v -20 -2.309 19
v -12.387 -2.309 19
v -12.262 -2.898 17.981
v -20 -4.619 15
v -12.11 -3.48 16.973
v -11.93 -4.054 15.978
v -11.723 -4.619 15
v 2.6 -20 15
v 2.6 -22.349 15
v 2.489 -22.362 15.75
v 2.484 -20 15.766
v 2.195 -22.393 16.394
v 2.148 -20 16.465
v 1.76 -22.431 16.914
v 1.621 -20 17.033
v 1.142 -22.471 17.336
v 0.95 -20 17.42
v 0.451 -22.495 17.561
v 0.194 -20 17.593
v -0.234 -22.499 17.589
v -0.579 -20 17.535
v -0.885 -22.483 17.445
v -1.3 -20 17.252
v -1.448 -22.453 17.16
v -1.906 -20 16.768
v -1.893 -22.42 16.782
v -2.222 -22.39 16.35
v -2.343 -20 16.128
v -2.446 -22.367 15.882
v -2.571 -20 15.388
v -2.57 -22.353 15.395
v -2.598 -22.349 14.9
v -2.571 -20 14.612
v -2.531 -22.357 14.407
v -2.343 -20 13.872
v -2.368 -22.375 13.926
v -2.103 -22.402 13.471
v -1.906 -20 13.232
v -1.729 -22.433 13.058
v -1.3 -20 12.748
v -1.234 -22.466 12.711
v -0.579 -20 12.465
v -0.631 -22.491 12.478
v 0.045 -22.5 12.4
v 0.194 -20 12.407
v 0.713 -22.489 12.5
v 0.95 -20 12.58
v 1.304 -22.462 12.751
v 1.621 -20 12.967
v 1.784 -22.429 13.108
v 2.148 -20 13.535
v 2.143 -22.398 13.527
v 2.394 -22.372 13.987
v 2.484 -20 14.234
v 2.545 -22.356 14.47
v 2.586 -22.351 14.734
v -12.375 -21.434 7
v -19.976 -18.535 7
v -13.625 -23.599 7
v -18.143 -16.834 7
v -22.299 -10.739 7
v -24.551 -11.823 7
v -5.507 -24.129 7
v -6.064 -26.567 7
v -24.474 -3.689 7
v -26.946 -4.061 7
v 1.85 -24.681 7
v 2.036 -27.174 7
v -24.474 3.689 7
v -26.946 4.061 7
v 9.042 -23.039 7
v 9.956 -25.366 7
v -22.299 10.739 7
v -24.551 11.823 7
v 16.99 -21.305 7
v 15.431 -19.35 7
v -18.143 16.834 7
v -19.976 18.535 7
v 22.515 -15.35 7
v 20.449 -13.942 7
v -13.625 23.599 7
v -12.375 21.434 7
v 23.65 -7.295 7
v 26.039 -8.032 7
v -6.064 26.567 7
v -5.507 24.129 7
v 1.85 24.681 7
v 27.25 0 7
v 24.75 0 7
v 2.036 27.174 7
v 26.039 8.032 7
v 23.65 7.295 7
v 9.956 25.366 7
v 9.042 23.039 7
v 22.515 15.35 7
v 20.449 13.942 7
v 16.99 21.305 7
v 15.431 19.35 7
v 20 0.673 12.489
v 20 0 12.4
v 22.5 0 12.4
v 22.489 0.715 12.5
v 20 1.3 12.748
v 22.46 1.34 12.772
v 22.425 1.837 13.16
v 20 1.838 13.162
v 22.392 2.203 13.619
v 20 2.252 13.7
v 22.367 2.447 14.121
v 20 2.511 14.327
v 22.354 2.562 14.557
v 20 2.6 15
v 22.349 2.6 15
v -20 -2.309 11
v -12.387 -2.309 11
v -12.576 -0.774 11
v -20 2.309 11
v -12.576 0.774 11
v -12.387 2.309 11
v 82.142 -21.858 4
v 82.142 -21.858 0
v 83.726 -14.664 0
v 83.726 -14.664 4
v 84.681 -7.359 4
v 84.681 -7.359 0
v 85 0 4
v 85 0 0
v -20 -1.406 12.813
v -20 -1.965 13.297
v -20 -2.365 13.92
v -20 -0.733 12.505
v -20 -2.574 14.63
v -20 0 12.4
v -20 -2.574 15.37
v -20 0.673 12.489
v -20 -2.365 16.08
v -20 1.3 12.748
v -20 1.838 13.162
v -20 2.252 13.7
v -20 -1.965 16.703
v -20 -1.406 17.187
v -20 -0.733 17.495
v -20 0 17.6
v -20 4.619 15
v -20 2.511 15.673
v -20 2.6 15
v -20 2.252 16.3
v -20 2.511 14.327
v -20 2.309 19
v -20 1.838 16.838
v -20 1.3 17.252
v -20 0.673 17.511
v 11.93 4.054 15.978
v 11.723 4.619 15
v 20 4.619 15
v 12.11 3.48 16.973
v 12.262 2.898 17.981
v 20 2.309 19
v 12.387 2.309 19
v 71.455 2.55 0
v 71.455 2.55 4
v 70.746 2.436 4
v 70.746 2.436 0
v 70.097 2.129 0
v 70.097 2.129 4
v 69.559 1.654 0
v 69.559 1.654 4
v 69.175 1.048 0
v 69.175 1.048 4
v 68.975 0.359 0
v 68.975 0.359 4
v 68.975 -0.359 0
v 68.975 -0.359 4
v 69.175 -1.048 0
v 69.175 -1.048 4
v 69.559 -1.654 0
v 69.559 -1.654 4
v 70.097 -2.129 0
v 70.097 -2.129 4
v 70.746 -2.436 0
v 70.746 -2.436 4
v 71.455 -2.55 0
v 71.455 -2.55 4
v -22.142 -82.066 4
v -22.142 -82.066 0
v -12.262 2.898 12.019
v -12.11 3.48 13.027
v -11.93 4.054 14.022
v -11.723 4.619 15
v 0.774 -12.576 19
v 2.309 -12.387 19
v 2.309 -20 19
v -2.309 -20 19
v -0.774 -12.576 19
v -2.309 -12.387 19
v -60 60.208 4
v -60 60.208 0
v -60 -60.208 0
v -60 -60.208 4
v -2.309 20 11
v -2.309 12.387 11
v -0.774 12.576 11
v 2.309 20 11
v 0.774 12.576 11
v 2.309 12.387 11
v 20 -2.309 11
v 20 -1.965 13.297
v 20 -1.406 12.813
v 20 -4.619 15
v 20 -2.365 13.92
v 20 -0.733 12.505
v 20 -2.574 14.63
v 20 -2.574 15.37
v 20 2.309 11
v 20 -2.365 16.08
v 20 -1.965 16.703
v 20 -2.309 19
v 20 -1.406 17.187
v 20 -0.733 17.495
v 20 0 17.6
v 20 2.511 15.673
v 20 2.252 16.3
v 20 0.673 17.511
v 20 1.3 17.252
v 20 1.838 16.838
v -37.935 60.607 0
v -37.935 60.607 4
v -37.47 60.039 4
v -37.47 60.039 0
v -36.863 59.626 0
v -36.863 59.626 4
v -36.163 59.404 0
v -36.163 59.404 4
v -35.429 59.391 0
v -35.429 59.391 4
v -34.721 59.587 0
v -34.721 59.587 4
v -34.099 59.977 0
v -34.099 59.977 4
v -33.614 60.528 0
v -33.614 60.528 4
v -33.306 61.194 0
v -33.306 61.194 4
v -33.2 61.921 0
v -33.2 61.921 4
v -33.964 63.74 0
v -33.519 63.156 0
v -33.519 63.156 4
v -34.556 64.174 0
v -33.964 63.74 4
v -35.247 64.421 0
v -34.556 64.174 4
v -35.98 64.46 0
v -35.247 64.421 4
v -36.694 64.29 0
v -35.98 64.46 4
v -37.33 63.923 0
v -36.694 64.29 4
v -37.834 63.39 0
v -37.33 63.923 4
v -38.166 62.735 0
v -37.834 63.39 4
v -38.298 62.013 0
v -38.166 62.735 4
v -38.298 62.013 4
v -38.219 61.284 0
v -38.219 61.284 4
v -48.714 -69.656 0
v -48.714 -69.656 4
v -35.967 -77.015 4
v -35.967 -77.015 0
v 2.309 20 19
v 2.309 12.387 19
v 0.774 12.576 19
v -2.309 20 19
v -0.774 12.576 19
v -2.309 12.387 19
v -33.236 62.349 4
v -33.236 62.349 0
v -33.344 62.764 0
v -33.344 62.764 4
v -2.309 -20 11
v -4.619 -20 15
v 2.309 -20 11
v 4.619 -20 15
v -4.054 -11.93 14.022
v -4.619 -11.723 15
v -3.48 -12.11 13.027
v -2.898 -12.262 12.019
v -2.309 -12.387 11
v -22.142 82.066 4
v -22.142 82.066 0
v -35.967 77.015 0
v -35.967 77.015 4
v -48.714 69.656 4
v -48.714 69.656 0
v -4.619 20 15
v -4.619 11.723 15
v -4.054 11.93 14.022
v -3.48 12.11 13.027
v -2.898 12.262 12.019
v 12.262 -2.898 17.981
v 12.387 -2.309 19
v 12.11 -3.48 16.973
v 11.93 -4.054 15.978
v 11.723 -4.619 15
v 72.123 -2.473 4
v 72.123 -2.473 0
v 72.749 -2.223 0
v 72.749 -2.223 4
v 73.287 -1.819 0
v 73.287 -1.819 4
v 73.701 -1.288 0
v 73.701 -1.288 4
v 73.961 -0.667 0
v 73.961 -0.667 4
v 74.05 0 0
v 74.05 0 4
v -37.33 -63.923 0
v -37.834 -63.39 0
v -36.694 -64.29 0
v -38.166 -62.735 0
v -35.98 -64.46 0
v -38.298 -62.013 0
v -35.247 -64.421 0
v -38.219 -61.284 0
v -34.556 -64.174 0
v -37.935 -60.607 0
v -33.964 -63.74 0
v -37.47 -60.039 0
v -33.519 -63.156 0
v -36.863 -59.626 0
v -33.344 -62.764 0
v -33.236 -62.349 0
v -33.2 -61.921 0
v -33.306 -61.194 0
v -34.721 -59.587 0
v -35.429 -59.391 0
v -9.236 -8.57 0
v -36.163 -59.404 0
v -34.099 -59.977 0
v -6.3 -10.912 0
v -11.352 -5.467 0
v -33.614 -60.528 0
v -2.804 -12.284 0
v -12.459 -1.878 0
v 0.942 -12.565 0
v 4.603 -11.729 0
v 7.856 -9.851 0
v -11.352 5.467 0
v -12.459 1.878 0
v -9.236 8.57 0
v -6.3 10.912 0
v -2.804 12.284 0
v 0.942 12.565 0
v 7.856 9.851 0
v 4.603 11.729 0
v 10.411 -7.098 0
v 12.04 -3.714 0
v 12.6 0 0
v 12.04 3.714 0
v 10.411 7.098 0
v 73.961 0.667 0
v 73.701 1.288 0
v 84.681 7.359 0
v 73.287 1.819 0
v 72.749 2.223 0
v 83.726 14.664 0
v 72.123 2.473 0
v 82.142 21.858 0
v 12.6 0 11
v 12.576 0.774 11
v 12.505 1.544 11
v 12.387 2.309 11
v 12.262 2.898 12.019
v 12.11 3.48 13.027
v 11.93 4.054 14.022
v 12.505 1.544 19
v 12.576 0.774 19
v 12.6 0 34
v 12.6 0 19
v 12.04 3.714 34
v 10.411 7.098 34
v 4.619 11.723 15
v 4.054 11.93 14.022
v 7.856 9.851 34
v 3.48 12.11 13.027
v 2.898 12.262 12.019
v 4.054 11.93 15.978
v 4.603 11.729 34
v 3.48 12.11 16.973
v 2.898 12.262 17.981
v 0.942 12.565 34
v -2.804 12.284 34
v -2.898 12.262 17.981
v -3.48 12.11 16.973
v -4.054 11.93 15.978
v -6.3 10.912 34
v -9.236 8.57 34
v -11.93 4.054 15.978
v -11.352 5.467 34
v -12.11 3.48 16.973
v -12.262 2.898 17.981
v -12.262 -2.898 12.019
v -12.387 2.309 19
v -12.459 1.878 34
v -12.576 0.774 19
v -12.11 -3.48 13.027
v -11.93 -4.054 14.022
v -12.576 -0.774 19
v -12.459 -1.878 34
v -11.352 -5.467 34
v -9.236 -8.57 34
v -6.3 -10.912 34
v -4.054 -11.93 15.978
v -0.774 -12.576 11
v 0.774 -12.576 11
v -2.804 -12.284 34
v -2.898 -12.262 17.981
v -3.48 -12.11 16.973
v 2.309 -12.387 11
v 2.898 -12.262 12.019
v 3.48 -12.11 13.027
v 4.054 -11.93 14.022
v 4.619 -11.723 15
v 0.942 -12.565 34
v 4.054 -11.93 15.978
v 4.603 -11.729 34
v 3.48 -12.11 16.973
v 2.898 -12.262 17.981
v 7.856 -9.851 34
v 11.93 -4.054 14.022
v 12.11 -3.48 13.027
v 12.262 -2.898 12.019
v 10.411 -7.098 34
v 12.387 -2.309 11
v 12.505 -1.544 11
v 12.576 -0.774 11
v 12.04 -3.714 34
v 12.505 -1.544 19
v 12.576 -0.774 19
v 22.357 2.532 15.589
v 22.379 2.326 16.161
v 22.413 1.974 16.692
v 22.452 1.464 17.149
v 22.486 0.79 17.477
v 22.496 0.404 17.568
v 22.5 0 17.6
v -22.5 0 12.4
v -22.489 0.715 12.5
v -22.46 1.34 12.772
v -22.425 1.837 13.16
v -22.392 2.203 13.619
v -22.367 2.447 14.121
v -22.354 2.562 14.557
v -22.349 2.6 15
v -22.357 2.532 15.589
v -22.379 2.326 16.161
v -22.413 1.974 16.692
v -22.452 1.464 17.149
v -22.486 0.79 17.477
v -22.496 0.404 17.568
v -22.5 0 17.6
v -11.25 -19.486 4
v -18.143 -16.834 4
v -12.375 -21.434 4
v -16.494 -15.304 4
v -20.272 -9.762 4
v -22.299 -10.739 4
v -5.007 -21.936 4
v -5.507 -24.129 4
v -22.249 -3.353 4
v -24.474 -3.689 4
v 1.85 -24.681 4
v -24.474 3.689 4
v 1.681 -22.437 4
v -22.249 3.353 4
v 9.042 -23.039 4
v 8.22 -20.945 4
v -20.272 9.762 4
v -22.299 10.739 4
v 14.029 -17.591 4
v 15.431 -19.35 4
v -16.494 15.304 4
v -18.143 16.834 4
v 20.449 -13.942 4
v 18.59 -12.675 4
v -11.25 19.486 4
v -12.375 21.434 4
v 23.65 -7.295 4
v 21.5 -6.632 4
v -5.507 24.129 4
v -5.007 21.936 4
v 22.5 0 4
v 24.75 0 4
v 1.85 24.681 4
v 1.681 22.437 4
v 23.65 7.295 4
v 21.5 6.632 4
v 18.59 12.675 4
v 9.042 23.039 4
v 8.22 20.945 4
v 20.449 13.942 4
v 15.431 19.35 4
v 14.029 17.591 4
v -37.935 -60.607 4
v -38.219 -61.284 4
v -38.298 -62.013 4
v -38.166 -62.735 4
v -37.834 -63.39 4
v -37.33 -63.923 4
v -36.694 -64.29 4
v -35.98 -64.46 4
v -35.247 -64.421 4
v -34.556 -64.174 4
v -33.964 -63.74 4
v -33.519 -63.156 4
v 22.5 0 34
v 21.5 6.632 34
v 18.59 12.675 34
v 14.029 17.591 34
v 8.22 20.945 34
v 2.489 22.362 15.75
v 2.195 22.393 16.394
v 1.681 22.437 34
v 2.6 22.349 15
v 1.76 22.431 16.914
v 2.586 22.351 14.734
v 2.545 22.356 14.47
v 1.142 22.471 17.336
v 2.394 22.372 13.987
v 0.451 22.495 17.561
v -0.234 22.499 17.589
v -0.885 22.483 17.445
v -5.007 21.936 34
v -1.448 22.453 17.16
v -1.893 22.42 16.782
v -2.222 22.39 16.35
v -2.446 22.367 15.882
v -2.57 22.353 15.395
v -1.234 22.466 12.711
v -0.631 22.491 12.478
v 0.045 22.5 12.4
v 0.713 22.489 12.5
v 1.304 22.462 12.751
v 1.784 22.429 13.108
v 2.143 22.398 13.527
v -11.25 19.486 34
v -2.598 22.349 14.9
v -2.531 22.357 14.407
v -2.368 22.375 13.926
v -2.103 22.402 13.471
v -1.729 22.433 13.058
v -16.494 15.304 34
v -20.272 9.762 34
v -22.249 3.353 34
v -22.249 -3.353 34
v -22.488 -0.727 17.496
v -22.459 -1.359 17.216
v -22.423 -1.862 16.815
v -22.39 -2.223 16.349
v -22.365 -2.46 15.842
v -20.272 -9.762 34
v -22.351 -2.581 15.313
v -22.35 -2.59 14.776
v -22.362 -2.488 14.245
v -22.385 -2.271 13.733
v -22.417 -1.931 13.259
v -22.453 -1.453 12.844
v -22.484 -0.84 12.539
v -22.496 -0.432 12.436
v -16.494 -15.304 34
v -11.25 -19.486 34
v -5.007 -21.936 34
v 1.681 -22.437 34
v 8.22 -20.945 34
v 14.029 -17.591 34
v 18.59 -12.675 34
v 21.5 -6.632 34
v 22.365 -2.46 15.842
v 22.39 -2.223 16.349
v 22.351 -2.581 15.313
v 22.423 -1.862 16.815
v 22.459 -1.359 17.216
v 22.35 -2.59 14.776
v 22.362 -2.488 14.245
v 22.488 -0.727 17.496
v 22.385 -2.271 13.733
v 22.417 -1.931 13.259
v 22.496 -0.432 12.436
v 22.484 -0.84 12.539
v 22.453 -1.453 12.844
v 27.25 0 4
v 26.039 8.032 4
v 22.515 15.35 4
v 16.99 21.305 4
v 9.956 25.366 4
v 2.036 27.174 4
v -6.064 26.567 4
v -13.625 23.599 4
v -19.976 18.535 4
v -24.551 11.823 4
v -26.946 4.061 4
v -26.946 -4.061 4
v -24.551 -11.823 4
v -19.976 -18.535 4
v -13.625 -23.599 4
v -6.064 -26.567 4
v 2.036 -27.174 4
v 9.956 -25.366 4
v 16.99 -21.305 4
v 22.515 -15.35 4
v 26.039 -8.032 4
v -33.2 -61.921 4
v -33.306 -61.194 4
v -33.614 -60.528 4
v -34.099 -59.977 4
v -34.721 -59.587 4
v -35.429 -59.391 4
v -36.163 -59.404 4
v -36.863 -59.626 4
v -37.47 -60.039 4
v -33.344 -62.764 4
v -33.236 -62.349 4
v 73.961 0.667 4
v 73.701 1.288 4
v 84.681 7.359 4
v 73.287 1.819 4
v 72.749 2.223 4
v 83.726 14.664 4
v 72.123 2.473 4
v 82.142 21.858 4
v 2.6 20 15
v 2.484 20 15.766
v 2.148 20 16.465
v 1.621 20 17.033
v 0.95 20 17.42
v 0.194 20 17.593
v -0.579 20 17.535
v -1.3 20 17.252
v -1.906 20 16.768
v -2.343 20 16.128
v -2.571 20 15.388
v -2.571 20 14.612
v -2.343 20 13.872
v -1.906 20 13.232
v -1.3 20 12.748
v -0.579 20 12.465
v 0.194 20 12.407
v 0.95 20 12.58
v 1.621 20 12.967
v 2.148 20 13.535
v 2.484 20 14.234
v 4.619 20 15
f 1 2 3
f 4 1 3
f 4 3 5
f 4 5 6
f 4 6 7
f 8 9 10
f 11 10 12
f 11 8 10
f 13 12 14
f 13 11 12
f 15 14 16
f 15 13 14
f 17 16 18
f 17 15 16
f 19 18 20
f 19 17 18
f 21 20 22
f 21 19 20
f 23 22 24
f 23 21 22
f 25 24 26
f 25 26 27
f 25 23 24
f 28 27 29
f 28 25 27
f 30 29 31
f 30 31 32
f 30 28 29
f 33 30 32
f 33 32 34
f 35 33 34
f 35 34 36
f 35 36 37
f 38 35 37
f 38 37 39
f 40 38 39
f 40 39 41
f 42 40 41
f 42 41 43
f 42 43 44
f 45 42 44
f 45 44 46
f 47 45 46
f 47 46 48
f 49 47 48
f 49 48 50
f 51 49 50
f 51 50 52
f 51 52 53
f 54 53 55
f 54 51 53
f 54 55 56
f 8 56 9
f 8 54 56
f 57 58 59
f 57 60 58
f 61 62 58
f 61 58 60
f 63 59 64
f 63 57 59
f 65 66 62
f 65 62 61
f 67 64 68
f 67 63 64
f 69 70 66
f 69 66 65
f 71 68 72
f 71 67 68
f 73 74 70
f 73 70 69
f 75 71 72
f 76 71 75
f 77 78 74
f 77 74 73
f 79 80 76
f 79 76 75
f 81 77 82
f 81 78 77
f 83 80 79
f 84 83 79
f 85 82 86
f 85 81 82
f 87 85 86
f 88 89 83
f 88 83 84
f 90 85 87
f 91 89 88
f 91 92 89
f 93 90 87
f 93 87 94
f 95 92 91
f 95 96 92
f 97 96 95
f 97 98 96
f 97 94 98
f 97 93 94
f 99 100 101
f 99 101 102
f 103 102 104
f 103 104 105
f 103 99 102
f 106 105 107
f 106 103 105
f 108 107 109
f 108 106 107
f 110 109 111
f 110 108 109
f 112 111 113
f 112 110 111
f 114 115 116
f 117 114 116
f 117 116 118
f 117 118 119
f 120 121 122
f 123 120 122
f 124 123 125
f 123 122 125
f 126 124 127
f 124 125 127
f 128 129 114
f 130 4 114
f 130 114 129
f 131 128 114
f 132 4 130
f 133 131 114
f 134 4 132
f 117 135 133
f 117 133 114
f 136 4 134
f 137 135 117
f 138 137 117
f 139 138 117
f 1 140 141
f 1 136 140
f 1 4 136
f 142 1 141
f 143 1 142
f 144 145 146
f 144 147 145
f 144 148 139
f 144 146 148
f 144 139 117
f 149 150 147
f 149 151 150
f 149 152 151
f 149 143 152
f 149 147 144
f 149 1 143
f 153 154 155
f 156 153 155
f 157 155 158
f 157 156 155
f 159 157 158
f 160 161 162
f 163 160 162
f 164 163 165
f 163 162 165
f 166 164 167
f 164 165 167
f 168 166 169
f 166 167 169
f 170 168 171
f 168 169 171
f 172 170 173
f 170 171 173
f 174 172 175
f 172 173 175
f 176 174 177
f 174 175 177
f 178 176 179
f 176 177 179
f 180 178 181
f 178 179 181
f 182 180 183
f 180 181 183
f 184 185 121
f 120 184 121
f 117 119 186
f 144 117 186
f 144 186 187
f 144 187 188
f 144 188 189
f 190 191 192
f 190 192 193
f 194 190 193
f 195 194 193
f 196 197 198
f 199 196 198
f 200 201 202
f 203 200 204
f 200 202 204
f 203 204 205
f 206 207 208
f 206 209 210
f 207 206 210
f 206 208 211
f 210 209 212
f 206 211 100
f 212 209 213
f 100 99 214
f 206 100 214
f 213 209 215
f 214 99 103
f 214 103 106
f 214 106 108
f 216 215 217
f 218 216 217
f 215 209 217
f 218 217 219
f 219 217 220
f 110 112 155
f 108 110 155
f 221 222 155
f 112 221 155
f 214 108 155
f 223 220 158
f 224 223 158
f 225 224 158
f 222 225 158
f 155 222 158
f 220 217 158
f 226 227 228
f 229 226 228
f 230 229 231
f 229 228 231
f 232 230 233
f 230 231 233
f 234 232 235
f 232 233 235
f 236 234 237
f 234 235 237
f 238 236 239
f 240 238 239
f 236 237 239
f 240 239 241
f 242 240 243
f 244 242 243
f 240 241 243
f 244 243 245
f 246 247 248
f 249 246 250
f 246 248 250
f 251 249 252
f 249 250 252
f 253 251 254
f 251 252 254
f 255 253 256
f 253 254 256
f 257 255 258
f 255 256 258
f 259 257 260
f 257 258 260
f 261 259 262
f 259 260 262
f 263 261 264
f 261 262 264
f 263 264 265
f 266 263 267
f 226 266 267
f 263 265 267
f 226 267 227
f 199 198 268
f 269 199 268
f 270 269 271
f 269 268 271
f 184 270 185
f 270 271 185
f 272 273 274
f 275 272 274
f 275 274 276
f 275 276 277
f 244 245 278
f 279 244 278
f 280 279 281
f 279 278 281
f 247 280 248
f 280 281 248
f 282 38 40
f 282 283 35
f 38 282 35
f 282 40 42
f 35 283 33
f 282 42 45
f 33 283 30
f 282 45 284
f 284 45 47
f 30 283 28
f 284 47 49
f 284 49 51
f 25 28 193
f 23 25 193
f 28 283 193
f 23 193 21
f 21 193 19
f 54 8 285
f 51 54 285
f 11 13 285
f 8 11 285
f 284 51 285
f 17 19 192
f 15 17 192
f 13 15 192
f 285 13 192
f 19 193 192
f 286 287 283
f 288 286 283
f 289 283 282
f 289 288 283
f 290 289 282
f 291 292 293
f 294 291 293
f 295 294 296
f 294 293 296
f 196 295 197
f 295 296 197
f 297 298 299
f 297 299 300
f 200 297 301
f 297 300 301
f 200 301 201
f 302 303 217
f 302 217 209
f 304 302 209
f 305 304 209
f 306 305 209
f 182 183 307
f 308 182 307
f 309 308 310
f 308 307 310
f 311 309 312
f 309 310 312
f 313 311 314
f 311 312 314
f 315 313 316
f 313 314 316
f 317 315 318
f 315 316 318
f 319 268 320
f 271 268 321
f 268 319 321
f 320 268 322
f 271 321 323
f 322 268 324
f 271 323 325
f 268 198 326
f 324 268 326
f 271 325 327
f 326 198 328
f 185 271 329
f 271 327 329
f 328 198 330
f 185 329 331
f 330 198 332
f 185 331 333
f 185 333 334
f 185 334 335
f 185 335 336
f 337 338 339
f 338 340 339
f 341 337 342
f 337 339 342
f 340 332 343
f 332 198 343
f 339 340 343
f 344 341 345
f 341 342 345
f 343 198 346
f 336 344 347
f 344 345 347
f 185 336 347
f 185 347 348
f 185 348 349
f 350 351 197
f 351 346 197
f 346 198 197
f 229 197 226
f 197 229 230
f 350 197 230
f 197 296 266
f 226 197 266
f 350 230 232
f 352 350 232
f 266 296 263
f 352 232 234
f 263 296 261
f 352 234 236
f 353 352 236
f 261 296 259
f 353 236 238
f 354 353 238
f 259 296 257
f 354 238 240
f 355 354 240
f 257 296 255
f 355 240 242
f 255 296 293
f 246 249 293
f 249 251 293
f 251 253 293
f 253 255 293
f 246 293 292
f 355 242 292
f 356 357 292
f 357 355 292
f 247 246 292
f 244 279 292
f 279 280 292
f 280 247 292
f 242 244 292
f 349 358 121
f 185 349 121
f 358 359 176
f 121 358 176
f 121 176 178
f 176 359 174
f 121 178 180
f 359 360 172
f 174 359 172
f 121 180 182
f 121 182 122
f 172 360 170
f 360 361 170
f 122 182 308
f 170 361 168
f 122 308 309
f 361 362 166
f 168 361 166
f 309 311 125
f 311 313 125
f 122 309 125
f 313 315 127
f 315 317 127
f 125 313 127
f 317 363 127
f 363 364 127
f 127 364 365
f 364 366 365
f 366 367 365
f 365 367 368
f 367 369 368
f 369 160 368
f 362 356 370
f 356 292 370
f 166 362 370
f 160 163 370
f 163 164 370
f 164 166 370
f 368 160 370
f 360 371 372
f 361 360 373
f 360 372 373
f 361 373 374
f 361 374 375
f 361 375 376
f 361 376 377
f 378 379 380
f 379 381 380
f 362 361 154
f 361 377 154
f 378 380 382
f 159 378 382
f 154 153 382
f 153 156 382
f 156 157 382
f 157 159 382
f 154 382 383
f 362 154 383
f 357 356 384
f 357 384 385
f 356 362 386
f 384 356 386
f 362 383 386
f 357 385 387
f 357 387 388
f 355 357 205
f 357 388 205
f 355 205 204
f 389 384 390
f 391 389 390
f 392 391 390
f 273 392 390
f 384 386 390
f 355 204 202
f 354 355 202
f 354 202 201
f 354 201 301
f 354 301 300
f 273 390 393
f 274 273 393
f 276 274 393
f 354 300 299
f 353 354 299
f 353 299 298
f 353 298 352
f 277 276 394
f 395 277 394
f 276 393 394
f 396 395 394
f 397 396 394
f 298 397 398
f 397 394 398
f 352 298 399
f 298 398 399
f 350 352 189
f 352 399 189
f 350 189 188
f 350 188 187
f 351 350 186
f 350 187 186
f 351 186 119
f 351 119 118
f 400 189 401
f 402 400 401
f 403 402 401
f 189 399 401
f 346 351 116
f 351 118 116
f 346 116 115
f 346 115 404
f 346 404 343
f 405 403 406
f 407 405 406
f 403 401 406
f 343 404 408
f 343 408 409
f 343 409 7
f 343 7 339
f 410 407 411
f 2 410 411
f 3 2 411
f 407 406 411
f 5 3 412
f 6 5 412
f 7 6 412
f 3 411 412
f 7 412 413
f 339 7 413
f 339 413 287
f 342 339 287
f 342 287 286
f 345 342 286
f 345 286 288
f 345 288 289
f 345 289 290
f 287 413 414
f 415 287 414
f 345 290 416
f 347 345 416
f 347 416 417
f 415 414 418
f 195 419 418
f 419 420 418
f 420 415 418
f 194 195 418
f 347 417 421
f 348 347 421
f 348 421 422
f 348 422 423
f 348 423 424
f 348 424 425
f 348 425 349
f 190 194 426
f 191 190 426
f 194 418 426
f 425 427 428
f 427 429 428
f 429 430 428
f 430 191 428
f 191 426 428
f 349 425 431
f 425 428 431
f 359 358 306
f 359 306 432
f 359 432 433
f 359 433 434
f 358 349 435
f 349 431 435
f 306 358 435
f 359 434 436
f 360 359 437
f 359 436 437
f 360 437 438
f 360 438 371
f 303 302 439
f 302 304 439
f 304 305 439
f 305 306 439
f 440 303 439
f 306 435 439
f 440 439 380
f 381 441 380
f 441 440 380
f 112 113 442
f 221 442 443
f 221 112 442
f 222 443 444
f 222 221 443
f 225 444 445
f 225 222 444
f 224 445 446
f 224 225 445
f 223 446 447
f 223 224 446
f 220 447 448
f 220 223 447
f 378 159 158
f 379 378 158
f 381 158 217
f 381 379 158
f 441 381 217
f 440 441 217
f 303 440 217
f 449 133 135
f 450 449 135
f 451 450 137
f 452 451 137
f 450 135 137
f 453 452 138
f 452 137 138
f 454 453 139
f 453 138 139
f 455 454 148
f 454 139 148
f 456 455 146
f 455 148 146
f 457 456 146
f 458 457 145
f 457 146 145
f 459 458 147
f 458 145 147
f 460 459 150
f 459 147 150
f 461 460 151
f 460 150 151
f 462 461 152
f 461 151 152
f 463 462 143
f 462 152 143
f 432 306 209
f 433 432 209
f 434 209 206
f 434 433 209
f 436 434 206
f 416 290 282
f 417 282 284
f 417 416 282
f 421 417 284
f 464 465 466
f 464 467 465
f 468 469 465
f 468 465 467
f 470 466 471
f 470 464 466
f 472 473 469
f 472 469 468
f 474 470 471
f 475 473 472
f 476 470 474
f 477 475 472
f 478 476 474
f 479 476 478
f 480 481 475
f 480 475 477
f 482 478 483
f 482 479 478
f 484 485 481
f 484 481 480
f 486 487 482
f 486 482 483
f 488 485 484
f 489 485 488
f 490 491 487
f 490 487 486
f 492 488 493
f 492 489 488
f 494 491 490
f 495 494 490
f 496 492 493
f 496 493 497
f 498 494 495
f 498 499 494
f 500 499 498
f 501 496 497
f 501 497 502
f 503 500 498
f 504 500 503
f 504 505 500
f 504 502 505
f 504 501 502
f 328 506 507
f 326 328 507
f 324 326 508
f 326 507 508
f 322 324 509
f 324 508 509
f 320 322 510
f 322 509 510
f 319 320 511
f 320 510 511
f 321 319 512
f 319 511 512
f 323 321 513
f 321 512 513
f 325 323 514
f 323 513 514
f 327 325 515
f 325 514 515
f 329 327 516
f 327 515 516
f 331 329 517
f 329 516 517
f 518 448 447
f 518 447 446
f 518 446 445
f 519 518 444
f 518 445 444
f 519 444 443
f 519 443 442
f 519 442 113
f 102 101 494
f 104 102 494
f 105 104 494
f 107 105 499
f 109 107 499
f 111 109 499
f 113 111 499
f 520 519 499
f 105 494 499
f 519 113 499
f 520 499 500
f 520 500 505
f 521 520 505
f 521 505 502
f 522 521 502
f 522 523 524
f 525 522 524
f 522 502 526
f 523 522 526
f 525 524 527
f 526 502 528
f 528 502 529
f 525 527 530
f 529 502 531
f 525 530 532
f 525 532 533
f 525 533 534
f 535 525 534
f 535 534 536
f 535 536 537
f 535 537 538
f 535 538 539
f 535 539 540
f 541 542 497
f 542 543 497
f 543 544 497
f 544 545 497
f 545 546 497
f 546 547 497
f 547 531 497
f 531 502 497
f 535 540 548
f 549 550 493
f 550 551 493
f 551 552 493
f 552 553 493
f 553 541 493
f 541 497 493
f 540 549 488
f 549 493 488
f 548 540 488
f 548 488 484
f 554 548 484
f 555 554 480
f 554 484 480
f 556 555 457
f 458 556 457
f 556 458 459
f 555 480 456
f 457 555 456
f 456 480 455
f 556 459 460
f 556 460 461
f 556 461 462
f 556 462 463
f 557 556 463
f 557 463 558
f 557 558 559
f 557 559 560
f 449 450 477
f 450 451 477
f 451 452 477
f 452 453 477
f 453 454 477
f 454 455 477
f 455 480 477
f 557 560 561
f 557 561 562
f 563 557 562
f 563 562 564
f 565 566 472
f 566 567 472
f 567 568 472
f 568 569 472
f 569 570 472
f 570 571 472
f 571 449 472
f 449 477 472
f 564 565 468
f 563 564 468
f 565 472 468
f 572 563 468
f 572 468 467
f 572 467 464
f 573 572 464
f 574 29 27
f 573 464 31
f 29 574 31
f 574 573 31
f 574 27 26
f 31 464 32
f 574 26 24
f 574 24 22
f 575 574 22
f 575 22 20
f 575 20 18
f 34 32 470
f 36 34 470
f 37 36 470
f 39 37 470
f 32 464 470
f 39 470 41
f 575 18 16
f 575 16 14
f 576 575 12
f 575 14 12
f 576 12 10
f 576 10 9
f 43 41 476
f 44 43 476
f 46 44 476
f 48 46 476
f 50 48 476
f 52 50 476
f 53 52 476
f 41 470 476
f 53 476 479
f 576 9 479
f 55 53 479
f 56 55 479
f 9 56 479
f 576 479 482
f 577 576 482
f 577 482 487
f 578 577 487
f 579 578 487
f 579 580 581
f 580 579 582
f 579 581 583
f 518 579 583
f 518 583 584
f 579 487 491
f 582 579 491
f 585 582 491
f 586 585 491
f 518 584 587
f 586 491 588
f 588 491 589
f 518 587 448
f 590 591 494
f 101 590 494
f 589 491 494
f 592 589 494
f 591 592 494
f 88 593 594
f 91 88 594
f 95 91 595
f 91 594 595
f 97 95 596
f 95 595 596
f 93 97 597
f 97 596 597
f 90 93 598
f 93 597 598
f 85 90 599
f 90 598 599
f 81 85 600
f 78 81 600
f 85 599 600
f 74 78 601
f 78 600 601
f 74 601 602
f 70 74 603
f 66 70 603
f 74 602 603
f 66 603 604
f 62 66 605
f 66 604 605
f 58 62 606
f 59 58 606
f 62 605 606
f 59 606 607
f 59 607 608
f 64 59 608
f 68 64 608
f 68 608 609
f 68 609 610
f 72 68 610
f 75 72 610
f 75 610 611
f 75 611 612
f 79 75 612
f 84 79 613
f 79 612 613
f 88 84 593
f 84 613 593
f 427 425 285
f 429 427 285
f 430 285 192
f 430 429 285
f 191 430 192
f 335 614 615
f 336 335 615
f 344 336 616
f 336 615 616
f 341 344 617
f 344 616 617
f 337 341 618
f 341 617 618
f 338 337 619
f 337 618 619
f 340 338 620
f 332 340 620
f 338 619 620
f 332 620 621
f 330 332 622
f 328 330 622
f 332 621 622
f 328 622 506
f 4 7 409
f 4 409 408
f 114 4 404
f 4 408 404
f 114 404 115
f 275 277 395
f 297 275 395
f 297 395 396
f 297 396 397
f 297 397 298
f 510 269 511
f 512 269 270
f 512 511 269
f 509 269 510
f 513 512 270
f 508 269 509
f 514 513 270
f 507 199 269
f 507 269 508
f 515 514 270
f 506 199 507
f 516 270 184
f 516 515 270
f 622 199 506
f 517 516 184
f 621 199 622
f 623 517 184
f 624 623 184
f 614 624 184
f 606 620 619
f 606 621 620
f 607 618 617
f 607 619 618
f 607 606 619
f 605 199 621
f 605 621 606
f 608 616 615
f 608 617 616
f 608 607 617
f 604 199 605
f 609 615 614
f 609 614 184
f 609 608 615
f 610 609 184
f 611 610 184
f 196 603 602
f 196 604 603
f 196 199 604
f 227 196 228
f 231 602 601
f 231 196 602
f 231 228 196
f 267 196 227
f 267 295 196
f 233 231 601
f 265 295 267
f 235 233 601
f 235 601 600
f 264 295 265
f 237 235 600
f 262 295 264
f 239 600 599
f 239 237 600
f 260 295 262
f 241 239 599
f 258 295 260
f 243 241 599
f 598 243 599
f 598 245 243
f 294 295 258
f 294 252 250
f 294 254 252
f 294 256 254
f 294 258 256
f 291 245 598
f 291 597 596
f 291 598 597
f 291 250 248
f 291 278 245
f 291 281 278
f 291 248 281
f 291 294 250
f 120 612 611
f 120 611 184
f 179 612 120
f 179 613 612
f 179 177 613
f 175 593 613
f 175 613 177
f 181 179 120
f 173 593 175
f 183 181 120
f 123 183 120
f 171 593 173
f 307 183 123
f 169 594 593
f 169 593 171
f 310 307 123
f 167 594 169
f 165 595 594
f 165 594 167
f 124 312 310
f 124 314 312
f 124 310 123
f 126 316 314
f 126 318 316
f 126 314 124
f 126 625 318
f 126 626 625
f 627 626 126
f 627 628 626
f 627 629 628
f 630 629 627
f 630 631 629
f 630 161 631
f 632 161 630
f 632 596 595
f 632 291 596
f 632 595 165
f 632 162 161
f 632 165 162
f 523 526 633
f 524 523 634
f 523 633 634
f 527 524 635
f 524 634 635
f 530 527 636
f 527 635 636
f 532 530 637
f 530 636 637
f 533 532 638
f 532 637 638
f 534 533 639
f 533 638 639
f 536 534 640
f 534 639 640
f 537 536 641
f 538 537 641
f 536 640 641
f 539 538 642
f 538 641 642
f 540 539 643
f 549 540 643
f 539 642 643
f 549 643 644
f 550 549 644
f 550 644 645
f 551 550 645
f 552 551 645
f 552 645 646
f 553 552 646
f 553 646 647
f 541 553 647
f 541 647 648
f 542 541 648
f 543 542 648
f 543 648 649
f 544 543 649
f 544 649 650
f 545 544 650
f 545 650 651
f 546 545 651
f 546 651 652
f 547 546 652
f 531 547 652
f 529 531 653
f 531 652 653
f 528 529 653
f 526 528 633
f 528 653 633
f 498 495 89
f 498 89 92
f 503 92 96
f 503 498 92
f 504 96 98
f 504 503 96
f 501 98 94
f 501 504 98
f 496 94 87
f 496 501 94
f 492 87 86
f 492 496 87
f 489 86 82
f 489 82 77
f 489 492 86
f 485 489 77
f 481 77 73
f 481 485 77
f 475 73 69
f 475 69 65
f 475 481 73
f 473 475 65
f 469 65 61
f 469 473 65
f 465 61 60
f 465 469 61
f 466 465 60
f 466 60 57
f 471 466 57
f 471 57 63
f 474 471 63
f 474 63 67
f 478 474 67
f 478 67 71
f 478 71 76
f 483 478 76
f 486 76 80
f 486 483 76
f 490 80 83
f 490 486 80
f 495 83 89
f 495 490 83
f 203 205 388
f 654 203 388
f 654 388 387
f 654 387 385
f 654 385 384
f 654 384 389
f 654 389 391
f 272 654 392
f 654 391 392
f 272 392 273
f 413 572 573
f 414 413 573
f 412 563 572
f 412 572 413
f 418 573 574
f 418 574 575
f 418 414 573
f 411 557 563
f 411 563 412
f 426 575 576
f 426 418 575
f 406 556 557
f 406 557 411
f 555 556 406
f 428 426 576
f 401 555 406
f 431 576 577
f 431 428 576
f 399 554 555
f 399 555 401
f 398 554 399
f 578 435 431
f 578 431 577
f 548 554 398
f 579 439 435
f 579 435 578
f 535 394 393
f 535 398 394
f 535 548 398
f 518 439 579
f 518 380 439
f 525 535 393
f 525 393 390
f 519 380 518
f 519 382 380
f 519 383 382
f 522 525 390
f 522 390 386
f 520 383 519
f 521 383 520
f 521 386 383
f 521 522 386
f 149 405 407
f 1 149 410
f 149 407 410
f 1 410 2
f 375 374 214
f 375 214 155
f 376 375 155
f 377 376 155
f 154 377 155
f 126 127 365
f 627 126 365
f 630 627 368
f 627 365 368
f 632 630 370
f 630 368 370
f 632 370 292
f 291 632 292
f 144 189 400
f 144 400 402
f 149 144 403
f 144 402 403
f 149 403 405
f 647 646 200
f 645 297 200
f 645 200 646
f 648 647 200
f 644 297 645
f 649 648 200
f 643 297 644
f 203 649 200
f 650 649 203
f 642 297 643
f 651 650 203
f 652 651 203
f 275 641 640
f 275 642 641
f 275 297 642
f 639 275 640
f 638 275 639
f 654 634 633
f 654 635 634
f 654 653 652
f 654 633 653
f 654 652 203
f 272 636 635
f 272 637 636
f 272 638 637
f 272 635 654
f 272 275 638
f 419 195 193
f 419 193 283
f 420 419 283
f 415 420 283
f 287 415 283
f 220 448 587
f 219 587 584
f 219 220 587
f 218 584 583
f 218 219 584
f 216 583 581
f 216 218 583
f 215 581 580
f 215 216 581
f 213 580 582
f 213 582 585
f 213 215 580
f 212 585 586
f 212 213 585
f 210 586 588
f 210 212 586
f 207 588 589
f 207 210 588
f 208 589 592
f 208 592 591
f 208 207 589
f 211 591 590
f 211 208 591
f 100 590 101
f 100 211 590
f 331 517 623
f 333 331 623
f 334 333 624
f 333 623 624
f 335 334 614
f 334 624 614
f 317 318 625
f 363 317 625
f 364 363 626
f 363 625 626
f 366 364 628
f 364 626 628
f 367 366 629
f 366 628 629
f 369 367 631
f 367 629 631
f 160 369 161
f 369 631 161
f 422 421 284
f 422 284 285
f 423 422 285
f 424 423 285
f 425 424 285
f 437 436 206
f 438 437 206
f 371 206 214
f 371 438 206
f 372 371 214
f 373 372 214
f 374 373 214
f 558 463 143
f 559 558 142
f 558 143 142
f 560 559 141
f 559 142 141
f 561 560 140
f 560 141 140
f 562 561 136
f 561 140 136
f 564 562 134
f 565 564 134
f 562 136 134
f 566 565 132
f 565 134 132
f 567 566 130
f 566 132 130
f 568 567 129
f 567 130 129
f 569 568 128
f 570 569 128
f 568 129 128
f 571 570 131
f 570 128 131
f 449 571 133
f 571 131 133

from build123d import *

# Parameters (mm, degrees)
F1_DEPTH       = 4
F3_DEPTH       = 25
F4_R           = 22.5
F4_R_2         = 12.6
F5_DEPTH       = 30
F6_R           = 12.6
F7_DEPTH       = 25
F9_DEPTH       = 20
F9_DEPTH_BACK  = 20
F11_DEPTH      = 20
F11_DEPTH_BACK = 20
F13_DEPTH      = 60.001
F13_DEPTH_BACK = 85.001
F14_R          = 2.6
F15_DEPTH      = 82.066510674
F15_DEPTH_BACK = 82.066510674
F16_R          = 27.25
F16_R_2        = 24.75
F17_DEPTH      = 3


with BuildPart() as f1:
    # F0 (on Top) → F1 (new body)
    with BuildSketch(Plane.XY):
        with BuildLine():
            ThreePointArc((82.1416340365, -21.8575377801), (84.2823792174, -11.0218216937), (85, 0))
            ThreePointArc((85, 0), (84.2823792174, 11.0218216937), (82.1416340365, 21.8575377801))
            Line((82.1416340365, 21.8575377801), (-22.1416340365, 82.065510674))
            ThreePointArc((-22.1416340365, 82.065510674), (-42.5, 73.6121593217), (-60, 60.207972894))
            Line((-60, 60.207972894), (-60, -60.207972894))
            ThreePointArc((-60, -60.207972894), (-42.5, -73.6121593217), (-22.1416340365, -82.065510674))
            Line((-22.1416340365, -82.065510674), (82.1416340365, -21.8575377801))
        make_face()
    extrude(amount=F1_DEPTH)

    # F2 (on face) → F3 (cut)
    with BuildSketch(Plane.XY.offset(4)):
        with BuildLine():
            ThreePointArc((71.454527972, -2.5495945353), (71.4886310891, -1.275), (71.5, 0))
            ThreePointArc((71.5, 0), (71.4886310891, 1.275), (71.454527972, 2.5495945353))
            ThreePointArc((71.454527972, 2.5495945353), (68.95, 0), (71.454527972, -2.5495945353))
        make_face()
        with BuildLine():
            ThreePointArc((71.454527972, 2.5495945353), (71.4886310891, 1.275), (71.5, 0))
            ThreePointArc((71.5, 0), (71.4886310891, -1.275), (71.454527972, -2.5495945353))
            ThreePointArc((71.454527972, -2.5495945353), (73.2869731851, -1.8191280427), (74.05, 0))
            ThreePointArc((74.05, 0), (73.2869731851, 1.8191280427), (71.454527972, 2.5495945353))
        make_face()
        with BuildLine():
            ThreePointArc((-37.935277623, -60.6066391715), (-37.025, -64.1291811502), (-33.5192503491, -63.1562337069))
            ThreePointArc((-33.5192503491, -63.1562337069), (-35.75, -61.9208163706), (-37.935277623, -60.6066391715))
        make_face()
        with BuildLine():
            ThreePointArc((-37.935277623, -60.6066391715), (-35.75, -61.9208163706), (-33.5192503491, -63.1562337069))
            ThreePointArc((-33.5192503491, -63.1562337069), (-33.2811023097, -62.5588165234), (-33.2, -61.9208163706))
            ThreePointArc((-33.2, -61.9208163706), (-35.0680754949, -59.4636881751), (-37.935277623, -60.6066391715))
        make_face()
        with BuildLine():
            ThreePointArc((-37.935277623, 60.6066391715), (-35.75, 61.9208163706), (-33.5192503491, 63.1562337069))
            ThreePointArc((-33.5192503491, 63.1562337069), (-37.025, 64.1291811502), (-37.935277623, 60.6066391715))
        make_face()
        with BuildLine():
            ThreePointArc((-33.2, 61.9208163706), (-33.2811023097, 62.5588165234), (-33.5192503491, 63.1562337069))
            ThreePointArc((-33.5192503491, 63.1562337069), (-35.75, 61.9208163706), (-37.935277623, 60.6066391715))
            ThreePointArc((-37.935277623, 60.6066391715), (-35.0680754949, 59.4636881751), (-33.2, 61.9208163706))
        make_face()
    extrude(amount=-F3_DEPTH, mode=Mode.SUBTRACT)

    # F4 (on face) → F5 (join)
    with BuildSketch(Plane.XY.offset(4)):
        Circle(F4_R)
        Circle(F4_R_2, mode=Mode.SUBTRACT)
    extrude(amount=F5_DEPTH)

    # F6 (on face) → F7 (cut)
    with BuildSketch(Plane.XY.offset(4)):
        Circle(F6_R)
    extrude(amount=-F7_DEPTH, mode=Mode.SUBTRACT)

    # F8 (on Right) → F9 (cut, two sides)
    with BuildSketch(Plane.YZ) as f9_sk:
        Polygon((-2.3094010768, 11), (2.3094010768, 11), (4.6188021535, 15), (2.3094010768, 19), (-2.3094010768, 19), (-4.6188021535, 15), align=None)
    extrude(amount=F9_DEPTH, mode=Mode.SUBTRACT)
    extrude(f9_sk.sketch, amount=-F9_DEPTH_BACK, mode=Mode.SUBTRACT)

    # F10 (on Front) → F11 (cut, two sides)
    with BuildSketch(Plane.XZ) as f11_sk:
        Polygon((-2.3094010768, 11), (2.3094010768, 11), (4.6188021535, 15), (2.3094010768, 19), (-2.3094010768, 19), (-4.6188021535, 15), align=None)
    extrude(amount=F11_DEPTH, mode=Mode.SUBTRACT)
    extrude(f11_sk.sketch, amount=-F11_DEPTH_BACK, mode=Mode.SUBTRACT)

    # F12 (on Right) → F13 (cut, two sides)
    with BuildSketch(Plane.YZ) as f13_sk:
        with BuildLine():
            ThreePointArc((0, 17.6), (-2.6, 15), (0, 12.4))
            Line((0, 12.4), (0, 17.6))
        make_face()
        with BuildLine():
            Line((0, 17.6), (0, 12.4))
            ThreePointArc((0, 12.4), (1.8384776311, 13.1615223689), (2.6, 15))
            ThreePointArc((2.6, 15), (1.8384776311, 16.8384776311), (0, 17.6))
        make_face()
    extrude(amount=-F13_DEPTH, mode=Mode.SUBTRACT)
    extrude(f13_sk.sketch, amount=F13_DEPTH_BACK, mode=Mode.SUBTRACT)

    # F14 (on Front) → F15 (cut, two sides)
    with BuildSketch(Plane.XZ) as f15_sk:
        with Locations((0, 15)):
            Circle(F14_R)
    extrude(amount=F15_DEPTH, mode=Mode.SUBTRACT)
    extrude(f15_sk.sketch, amount=-F15_DEPTH_BACK, mode=Mode.SUBTRACT)

    # F16 (on face) → F17 (join)
    with BuildSketch(Plane.XY.offset(4)):
        Circle(F16_R)
        Circle(F16_R_2, mode=Mode.SUBTRACT)
    extrude(amount=F17_DEPTH)


solid = f1.part
